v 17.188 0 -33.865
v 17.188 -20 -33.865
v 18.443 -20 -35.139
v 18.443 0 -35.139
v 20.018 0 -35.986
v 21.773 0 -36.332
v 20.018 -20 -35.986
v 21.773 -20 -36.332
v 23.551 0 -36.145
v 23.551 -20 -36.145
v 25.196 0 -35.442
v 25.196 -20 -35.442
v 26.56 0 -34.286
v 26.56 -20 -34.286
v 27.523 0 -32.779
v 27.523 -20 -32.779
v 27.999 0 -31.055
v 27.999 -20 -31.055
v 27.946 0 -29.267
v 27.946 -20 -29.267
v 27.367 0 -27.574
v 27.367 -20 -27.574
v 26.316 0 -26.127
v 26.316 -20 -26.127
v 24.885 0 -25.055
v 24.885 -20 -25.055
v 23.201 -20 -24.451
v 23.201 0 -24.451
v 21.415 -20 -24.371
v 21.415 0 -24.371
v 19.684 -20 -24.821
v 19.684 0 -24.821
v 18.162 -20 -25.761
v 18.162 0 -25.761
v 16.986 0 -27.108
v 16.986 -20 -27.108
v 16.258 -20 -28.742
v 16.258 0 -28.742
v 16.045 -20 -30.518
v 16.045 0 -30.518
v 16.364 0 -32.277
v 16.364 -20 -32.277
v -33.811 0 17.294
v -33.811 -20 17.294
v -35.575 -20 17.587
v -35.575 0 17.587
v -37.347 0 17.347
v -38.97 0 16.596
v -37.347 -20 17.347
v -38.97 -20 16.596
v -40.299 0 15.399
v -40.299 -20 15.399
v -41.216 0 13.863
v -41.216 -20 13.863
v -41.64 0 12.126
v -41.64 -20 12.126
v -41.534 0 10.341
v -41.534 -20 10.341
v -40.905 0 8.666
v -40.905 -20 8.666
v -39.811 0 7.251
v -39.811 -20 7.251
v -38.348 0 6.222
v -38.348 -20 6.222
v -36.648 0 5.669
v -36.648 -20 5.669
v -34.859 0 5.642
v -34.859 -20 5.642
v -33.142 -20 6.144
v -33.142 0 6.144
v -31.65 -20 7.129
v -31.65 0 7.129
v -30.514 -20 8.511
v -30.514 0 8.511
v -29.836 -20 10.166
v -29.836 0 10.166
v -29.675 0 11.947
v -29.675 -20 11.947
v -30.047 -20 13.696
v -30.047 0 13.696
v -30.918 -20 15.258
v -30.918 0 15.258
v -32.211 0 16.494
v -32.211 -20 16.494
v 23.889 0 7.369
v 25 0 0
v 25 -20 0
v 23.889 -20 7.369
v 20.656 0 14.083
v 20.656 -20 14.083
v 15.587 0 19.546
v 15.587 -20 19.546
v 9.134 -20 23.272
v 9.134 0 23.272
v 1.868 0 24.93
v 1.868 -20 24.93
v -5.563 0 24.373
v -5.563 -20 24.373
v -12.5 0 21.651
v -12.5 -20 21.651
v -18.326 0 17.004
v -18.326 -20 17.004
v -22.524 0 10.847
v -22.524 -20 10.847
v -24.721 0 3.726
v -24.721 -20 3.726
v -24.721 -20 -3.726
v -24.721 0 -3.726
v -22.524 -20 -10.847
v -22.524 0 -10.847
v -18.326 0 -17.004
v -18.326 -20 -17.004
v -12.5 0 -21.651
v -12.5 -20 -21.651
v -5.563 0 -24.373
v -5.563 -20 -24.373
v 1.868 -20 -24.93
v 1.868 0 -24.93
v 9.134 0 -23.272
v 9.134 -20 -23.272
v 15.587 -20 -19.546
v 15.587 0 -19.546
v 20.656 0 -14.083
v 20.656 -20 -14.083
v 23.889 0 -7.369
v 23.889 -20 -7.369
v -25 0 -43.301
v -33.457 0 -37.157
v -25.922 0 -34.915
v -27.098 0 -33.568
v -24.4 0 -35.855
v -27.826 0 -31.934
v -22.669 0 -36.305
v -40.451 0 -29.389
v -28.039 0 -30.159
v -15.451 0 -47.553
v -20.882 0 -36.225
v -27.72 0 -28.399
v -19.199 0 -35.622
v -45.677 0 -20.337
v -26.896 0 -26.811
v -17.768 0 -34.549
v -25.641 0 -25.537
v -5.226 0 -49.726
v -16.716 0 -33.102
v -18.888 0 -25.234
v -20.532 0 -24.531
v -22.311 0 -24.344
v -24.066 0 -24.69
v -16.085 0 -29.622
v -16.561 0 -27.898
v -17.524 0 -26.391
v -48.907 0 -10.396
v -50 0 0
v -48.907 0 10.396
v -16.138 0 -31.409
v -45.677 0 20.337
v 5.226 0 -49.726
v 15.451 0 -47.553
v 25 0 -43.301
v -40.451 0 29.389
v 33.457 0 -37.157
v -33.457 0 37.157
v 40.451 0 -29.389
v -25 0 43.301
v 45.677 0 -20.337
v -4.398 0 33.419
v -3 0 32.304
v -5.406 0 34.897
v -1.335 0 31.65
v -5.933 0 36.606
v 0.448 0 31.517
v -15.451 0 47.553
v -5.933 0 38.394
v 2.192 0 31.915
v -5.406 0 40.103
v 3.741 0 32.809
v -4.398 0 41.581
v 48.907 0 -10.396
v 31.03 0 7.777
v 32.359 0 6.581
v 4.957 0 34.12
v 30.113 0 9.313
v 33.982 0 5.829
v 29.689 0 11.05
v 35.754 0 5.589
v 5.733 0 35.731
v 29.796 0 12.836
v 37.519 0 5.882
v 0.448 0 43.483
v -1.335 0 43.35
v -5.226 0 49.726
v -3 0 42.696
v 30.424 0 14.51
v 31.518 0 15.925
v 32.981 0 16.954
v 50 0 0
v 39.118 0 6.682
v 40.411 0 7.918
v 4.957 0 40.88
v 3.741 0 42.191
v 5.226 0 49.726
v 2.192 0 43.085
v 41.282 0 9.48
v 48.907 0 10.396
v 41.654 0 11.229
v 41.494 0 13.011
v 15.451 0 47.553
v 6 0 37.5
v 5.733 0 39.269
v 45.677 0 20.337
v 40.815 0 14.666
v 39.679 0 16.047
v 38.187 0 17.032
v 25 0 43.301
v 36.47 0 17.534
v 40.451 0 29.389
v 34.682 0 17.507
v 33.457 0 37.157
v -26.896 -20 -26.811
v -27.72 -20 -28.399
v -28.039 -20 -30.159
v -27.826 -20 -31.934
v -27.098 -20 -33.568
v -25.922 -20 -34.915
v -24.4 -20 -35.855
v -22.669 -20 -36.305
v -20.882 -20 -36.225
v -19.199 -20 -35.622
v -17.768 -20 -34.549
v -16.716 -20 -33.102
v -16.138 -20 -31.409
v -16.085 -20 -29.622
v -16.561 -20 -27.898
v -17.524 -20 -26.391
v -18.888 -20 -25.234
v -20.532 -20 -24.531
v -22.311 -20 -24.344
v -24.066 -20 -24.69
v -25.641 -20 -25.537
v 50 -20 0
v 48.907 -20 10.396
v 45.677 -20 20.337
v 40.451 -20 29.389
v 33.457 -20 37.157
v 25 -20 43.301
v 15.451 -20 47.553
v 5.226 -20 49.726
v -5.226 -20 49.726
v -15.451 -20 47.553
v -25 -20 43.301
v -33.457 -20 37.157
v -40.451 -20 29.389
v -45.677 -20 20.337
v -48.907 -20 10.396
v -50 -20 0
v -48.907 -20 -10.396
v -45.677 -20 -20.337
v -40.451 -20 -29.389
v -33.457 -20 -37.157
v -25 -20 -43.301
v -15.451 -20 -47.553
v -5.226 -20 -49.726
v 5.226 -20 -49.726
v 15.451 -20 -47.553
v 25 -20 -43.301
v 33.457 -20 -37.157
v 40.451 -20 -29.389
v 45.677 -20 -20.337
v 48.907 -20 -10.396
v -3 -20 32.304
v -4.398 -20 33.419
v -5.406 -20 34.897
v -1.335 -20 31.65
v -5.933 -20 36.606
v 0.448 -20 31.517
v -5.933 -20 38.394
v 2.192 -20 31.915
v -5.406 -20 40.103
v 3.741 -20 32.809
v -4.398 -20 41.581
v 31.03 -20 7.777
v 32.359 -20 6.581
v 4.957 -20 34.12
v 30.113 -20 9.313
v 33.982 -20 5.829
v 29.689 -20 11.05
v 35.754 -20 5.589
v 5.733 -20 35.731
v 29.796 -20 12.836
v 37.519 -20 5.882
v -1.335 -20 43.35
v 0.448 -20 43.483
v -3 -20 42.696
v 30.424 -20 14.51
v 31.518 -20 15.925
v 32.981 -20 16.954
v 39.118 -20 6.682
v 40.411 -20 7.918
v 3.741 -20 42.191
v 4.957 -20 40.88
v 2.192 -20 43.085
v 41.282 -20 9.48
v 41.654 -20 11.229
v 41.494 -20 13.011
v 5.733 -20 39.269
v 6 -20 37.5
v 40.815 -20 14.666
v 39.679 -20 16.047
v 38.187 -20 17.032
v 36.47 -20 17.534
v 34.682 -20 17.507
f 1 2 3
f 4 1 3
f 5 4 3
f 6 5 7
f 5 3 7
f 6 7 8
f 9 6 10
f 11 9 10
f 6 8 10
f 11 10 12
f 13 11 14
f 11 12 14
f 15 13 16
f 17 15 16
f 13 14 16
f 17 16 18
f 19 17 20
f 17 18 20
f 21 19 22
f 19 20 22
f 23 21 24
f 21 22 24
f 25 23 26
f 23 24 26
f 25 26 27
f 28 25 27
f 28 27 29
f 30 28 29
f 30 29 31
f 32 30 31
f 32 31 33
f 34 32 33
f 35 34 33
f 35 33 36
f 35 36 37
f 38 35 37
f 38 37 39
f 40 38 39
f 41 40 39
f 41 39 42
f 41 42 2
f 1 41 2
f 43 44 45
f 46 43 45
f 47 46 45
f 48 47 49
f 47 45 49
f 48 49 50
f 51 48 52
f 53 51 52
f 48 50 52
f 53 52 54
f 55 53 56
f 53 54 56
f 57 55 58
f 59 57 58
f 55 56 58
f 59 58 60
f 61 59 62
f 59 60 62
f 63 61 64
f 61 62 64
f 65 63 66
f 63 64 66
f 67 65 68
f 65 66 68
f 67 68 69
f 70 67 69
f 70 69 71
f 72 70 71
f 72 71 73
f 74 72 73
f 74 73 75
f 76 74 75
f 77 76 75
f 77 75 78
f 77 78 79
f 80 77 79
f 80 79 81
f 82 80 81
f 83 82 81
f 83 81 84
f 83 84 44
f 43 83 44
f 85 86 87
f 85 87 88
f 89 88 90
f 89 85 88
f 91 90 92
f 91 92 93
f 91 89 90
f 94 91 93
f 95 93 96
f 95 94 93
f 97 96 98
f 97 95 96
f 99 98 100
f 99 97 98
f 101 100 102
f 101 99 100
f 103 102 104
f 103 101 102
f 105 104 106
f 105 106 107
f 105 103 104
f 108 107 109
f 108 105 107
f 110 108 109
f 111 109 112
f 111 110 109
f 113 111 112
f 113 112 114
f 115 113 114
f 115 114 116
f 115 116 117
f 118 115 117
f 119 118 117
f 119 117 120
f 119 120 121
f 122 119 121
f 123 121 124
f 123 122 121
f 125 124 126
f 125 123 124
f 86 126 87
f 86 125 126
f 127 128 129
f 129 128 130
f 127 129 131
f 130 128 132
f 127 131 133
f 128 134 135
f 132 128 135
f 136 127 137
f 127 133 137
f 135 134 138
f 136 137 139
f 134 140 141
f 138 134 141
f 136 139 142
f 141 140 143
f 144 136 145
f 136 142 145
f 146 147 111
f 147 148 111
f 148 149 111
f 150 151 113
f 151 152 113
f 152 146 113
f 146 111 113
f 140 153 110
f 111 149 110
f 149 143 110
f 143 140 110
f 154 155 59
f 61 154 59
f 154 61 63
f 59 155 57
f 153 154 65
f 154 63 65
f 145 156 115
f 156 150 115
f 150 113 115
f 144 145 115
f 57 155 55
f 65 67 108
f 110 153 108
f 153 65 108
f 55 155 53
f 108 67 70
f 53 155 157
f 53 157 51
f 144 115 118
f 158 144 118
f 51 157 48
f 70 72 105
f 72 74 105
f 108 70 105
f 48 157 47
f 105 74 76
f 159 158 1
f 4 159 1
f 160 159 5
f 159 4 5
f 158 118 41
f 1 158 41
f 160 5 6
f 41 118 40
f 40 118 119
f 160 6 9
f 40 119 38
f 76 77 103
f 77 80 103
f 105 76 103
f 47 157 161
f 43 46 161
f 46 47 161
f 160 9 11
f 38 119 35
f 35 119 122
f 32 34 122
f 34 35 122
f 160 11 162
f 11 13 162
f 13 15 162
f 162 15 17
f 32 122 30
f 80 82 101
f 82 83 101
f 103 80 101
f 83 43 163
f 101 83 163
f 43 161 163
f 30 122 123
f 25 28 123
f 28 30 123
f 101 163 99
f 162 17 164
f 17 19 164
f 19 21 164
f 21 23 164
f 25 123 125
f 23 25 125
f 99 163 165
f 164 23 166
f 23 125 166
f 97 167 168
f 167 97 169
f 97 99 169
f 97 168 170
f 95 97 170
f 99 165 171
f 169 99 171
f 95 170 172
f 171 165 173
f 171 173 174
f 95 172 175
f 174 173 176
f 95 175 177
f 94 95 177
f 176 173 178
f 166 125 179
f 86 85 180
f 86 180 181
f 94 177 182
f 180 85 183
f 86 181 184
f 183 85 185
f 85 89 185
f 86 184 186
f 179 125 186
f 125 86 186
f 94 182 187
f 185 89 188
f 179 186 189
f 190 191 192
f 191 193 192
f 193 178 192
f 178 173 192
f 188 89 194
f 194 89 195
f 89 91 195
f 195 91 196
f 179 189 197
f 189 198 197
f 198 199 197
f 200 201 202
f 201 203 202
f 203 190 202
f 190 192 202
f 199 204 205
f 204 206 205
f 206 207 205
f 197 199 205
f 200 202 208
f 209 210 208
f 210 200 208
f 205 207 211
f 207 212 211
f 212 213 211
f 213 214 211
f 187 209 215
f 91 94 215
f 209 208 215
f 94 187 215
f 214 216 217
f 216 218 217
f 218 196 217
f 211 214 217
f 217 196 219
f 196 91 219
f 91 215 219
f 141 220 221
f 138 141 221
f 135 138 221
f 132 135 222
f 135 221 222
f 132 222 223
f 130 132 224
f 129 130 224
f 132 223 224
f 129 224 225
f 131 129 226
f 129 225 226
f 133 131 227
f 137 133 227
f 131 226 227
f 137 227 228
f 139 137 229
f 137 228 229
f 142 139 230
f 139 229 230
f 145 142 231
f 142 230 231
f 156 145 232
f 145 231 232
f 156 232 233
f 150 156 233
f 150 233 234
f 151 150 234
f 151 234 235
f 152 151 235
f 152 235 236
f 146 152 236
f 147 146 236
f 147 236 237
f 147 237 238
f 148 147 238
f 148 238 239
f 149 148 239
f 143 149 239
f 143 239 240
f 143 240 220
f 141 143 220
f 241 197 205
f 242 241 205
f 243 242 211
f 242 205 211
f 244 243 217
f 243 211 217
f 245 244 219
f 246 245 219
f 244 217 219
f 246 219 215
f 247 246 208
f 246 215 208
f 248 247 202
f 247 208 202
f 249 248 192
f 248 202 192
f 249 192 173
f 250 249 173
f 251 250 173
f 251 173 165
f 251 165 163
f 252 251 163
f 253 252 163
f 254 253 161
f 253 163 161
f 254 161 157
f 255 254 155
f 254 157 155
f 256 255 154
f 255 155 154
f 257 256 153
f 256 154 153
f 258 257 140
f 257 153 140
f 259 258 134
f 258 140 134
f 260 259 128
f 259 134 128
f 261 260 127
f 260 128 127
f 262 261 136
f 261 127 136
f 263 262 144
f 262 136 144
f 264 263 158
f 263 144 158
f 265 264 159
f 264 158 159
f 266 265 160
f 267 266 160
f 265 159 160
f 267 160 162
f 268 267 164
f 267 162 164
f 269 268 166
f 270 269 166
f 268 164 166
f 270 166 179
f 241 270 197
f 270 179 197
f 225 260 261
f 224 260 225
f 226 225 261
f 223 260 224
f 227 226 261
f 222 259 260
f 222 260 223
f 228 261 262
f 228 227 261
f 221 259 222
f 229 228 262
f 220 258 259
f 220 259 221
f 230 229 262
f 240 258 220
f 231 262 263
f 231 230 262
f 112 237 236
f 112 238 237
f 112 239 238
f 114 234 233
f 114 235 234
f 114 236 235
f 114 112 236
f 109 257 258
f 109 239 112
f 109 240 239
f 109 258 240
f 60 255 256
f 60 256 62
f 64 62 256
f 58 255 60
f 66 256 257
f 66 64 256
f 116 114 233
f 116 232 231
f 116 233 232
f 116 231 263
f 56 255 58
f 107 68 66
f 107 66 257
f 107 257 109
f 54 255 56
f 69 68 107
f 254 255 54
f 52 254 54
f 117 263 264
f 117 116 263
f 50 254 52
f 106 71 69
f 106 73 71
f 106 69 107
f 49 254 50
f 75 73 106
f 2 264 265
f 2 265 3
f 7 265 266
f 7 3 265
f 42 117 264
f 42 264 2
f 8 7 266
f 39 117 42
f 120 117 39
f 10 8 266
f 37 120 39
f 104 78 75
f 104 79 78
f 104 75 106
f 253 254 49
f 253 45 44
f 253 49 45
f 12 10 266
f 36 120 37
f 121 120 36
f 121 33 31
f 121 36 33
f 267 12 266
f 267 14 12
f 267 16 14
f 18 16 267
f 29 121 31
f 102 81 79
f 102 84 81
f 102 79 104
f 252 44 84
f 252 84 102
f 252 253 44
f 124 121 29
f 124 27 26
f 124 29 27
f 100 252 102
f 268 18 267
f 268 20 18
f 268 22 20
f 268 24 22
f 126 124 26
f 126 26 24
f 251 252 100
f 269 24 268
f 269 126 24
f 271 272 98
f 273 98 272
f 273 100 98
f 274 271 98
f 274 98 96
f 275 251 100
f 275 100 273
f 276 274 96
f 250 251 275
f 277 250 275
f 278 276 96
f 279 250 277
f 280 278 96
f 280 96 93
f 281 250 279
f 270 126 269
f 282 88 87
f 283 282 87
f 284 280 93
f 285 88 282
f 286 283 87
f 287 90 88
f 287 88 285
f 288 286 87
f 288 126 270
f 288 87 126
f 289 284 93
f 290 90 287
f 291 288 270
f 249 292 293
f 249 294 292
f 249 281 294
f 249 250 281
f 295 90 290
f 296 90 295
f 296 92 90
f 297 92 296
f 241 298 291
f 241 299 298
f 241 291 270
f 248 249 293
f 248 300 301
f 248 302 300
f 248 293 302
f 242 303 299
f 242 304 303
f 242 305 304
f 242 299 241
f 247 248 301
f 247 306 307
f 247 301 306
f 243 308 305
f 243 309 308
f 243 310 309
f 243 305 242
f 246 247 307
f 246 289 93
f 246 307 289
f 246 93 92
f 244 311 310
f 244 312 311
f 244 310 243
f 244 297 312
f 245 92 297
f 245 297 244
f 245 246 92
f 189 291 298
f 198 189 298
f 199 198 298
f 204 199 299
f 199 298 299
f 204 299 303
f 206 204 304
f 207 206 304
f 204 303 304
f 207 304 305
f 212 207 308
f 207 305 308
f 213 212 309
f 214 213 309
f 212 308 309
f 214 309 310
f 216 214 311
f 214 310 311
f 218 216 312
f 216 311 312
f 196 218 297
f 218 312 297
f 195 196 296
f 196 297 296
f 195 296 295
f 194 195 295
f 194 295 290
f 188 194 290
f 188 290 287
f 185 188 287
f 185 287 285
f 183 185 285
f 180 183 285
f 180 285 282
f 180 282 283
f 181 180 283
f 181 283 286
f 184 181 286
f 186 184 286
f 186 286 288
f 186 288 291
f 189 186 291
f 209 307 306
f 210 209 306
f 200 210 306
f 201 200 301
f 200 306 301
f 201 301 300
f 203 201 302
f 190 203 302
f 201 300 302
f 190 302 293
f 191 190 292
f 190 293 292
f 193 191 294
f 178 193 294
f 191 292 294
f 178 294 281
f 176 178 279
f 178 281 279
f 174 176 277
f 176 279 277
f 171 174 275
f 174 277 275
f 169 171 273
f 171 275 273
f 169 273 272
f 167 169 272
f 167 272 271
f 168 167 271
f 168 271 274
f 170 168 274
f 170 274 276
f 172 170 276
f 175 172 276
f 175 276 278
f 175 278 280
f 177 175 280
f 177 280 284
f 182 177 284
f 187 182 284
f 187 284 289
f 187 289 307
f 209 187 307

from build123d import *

# Parameters (mm, degrees)
F0_R            = 50
F0_R_2          = 25
F1_DEPTH        = 20
F2_R            = 6
F3_DEPTH        = 25
F3_COPIES_COUNT = 5


# Not quite as in the source:
# - a pattern or mirror of a feature is missing from the dataset's text; its kind, count and spacing are read off the source's solid


with BuildPart() as f1:
    # F0 (on Front) → F1 (new body)
    with BuildSketch(Plane.XZ):
        Circle(F0_R)
        Circle(F0_R_2, mode=Mode.SUBTRACT)
    extrude(amount=F1_DEPTH)

    # F2 (on face) → F3 (cut)
    with BuildSketch(Plane.XZ.offset(20)):
        with Locations((0, 37.5)):
            Circle(F2_R)
    f3 = extrude(amount=-F3_DEPTH, mode=Mode.SUBTRACT)

    # F3_copies: F3 ×5 about axis
    f3_copies_axis = Axis((0, 0, 0), (0, 1, 0))
    for i in range(1, F3_COPIES_COUNT):
        add(f3.rotate(f3_copies_axis, i * 360 / F3_COPIES_COUNT), mode=Mode.SUBTRACT)


solid = f1.part
